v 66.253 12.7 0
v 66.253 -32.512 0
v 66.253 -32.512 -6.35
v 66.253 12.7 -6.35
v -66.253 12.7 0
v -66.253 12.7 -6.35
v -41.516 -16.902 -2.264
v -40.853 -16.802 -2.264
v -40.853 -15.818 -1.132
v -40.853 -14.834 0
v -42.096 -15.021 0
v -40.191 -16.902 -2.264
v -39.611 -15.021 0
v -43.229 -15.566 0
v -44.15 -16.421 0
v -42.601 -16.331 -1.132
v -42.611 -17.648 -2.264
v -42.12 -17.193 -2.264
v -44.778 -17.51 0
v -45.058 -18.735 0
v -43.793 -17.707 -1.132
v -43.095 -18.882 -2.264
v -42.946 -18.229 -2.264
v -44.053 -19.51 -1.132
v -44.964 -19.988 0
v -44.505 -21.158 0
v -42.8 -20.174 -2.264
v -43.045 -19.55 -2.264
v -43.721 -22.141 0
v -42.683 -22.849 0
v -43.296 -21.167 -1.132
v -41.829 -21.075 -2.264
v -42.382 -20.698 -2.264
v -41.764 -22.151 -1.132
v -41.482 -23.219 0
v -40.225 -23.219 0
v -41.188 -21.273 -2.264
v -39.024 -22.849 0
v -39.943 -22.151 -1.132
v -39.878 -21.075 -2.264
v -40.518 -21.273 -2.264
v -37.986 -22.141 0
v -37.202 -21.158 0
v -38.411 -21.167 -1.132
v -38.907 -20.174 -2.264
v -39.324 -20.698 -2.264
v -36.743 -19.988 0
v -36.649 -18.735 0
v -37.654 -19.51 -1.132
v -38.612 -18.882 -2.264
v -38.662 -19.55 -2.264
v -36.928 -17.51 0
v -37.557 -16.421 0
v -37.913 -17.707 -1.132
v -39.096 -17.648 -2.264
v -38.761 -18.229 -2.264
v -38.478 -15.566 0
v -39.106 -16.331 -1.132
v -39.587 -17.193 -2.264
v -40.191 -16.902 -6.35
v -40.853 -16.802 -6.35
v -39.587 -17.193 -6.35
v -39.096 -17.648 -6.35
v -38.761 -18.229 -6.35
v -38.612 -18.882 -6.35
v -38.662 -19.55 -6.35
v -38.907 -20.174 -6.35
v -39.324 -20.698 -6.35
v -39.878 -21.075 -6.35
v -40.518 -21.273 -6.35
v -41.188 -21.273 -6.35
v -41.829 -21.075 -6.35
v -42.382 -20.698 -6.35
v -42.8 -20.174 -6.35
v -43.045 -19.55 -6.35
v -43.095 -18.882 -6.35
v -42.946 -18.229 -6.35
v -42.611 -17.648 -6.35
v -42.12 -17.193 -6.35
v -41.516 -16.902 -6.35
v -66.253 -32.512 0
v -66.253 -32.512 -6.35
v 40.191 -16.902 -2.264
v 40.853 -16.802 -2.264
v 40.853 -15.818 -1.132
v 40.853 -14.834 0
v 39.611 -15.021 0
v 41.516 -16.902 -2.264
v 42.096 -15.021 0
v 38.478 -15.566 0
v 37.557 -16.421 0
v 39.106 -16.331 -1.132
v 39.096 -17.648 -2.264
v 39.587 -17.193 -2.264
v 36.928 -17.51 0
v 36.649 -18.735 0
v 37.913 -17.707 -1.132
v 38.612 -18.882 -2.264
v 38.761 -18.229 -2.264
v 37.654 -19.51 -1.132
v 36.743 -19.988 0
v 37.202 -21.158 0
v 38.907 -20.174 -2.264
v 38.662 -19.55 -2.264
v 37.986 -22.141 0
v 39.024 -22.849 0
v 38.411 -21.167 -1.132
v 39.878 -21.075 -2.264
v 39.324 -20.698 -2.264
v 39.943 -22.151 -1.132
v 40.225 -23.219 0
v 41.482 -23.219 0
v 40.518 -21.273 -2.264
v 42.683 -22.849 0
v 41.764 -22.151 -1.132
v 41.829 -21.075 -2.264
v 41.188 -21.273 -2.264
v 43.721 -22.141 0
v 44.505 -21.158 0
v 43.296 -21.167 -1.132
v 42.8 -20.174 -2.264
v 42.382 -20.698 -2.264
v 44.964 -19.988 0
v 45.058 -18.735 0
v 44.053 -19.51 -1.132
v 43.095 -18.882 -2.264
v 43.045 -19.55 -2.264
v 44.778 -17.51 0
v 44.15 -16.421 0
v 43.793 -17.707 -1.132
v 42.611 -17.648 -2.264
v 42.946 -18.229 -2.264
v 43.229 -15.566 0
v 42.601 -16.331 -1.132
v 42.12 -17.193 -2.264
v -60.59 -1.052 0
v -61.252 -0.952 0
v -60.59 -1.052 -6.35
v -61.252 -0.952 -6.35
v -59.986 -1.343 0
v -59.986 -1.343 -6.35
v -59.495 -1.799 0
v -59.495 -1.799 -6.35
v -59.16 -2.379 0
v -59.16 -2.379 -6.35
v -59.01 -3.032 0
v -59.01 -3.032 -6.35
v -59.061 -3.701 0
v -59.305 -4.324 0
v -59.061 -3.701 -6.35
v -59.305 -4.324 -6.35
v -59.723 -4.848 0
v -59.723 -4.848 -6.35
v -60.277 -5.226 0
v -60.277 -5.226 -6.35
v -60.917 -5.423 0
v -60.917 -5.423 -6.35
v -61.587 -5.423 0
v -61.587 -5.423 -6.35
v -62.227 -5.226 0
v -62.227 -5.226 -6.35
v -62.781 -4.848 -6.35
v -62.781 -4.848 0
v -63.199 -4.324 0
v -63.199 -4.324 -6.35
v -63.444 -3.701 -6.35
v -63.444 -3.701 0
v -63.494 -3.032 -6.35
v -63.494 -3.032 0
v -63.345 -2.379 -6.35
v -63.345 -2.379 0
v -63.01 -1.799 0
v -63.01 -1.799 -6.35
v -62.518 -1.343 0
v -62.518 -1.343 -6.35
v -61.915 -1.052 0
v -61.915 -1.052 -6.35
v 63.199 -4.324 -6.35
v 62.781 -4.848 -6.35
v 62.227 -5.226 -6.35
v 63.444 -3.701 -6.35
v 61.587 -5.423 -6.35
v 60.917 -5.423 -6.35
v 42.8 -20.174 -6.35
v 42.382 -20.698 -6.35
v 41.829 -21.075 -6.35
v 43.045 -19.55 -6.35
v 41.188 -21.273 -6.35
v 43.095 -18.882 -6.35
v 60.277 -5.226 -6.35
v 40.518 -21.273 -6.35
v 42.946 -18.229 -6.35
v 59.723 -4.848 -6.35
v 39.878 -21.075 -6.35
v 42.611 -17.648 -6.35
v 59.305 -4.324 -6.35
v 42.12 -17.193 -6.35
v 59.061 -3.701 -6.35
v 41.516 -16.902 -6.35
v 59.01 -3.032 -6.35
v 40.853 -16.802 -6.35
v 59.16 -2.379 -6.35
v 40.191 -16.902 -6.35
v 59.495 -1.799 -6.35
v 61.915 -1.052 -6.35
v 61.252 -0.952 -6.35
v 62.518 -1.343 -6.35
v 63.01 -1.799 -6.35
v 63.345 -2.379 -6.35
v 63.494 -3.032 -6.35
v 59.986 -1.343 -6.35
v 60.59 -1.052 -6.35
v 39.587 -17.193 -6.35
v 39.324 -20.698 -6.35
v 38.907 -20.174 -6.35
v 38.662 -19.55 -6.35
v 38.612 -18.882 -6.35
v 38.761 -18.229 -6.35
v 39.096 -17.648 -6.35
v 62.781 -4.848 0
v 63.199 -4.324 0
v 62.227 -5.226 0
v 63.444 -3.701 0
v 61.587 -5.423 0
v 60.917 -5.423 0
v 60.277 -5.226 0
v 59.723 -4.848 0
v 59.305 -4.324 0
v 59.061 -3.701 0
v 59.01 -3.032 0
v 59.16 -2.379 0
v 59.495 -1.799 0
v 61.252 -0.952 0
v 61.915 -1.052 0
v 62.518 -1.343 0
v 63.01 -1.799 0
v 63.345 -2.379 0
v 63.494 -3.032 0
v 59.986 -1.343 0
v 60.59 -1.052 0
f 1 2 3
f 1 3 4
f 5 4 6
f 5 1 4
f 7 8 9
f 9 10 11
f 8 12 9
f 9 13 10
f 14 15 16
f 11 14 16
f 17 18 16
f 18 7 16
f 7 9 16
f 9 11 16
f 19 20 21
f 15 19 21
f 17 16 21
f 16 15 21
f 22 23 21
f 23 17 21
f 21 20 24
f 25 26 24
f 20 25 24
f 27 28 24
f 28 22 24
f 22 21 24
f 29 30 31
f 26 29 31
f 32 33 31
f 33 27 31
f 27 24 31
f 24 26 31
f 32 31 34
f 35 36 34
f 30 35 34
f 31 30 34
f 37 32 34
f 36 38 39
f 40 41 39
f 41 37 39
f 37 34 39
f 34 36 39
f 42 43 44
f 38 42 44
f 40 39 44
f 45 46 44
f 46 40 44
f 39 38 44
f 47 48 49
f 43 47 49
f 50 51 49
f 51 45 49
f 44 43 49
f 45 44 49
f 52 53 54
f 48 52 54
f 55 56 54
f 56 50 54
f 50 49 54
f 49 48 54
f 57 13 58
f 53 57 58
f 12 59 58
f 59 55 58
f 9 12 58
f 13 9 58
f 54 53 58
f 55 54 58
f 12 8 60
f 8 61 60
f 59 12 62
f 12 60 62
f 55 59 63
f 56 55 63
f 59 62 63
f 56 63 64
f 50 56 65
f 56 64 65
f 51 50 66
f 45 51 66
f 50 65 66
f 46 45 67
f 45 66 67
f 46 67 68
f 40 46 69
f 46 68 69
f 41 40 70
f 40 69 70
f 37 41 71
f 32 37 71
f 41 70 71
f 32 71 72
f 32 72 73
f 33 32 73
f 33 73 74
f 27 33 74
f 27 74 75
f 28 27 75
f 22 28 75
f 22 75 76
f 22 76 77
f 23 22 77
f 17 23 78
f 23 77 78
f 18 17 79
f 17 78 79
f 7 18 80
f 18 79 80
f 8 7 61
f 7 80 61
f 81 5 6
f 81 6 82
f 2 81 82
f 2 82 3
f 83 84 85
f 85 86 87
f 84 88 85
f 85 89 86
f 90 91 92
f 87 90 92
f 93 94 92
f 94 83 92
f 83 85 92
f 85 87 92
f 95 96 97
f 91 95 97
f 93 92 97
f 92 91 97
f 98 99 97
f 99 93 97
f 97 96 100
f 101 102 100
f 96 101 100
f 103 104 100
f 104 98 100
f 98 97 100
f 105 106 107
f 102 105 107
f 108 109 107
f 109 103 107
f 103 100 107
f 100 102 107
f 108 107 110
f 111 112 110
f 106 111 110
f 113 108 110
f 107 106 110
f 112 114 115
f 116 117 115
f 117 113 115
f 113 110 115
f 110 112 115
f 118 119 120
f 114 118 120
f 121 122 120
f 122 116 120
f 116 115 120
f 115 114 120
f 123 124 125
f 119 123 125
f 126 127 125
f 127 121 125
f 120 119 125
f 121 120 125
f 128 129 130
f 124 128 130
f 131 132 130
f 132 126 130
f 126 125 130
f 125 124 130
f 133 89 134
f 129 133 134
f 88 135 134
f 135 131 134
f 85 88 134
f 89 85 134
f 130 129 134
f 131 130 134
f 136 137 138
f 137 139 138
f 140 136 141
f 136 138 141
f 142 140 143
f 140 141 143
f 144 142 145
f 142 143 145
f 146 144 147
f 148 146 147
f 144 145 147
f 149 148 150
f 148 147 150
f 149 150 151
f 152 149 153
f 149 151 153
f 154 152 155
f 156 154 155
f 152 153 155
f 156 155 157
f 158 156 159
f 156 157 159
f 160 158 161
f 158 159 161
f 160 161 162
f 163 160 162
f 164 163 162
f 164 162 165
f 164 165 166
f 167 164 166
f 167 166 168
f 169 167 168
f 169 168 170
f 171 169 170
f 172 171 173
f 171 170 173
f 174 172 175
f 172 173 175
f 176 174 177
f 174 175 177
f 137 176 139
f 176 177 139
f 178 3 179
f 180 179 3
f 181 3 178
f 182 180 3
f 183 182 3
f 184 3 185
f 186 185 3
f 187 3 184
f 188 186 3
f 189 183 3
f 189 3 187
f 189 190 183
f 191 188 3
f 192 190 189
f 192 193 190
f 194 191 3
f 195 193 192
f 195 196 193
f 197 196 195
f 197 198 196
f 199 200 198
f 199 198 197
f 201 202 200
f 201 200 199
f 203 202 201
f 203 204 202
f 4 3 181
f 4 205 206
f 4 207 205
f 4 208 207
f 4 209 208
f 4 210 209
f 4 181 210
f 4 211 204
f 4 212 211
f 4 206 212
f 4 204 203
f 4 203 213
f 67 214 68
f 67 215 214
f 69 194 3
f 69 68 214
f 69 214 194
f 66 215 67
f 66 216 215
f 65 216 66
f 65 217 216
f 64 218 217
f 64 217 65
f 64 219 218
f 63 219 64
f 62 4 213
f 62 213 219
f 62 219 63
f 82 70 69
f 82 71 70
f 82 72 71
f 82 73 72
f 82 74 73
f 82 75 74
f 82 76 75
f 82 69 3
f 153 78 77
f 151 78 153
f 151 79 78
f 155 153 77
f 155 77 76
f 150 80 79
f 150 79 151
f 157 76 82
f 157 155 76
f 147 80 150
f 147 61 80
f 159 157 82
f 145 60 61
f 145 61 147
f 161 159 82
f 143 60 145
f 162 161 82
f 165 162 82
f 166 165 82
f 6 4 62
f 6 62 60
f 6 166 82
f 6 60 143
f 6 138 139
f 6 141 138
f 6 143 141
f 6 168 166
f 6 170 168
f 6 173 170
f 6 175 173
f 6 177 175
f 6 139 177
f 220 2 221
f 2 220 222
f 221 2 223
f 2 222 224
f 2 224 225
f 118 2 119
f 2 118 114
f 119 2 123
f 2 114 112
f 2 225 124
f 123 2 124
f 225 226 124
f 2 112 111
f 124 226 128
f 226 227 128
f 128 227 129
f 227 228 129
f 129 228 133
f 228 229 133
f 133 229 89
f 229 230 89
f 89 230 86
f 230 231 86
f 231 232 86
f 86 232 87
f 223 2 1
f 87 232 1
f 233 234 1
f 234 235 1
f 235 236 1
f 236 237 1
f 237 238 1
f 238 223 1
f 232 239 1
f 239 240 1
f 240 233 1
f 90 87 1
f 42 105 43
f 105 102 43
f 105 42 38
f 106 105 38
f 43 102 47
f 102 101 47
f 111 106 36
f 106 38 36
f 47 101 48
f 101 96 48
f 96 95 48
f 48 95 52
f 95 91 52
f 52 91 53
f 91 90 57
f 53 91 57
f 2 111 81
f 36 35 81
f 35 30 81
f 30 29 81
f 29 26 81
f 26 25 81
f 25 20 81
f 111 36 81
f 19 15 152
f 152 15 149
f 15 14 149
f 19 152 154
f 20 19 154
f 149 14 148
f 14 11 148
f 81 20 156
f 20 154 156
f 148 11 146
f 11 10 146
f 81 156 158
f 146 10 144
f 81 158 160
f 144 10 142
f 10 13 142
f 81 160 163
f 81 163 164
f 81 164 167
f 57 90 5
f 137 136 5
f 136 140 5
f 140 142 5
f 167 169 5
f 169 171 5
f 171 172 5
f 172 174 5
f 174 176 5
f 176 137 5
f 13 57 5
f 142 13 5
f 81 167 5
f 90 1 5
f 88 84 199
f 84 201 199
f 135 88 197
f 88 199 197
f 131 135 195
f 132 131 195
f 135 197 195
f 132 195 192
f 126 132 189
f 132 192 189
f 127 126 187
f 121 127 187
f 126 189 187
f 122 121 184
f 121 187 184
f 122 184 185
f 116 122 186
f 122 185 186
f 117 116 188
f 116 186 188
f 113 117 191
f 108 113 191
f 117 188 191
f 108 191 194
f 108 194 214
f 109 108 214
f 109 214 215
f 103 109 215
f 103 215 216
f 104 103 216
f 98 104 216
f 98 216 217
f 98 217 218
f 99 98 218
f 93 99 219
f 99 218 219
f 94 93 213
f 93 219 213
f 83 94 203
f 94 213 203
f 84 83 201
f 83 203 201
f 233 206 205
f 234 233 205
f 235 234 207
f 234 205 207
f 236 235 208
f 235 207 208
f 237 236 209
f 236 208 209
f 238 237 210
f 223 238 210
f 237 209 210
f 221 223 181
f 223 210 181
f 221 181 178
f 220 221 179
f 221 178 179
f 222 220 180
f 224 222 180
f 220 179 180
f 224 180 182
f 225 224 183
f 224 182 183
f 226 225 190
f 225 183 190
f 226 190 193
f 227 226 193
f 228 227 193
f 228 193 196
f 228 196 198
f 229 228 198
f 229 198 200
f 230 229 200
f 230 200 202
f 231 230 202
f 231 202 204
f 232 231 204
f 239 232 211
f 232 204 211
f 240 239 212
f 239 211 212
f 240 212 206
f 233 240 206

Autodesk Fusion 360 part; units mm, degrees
sketch "Sketch2" plane through (0, 0, 0) normal (0, 0, 1) x (1, 0, 0)
  line L0 (-66.2534, 12.7) -> (66.2534, 12.7)
  line L1 (66.2534, 12.7) -> (66.2534, -12.7)
  line L2 (66.2534, -12.7) -> (-66.2534, -12.7)
  line L3 (-66.2534, -12.7) -> (-66.2534, 12.7)
  line L4 (-66.2534, 0) -> (66.2534, 0) construction
  line L5 (0, 12.7) -> (0, -12.7) construction
  line L6 (-66.2534, -12.7) -> (66.2534, -12.7)
  line L7 (66.2534, -12.7) -> (66.2534, -32.512)
  line L8 (66.2534, -32.512) -> (-66.2534, -32.512)
  line L9 (-66.2534, -32.512) -> (-66.2534, -12.7)
  point P0 (-61.2521, 0)
  point P1 (61.2521, 0)
  point P2 (-40.8534, -19.05)
  point P3 (-61.2521, -3.2004)
  point P4 (61.2521, -3.2004)
  point P5 (40.8534, -19.05)
  dimension "d2" = 25.4
  dimension "d3" = 122.5042
  dimension "d4" = 132.5067
  dimension "d18" = 3.2004
  dimension "d19" = 25.4
  dimension "d22" = 19.05
  dimension "d23" = 19.812
extrude "Extrude1" add sketch "Sketch2" along normal blind 6.35
hole "Hole1" at (-61.2521, -3.2004, 0) at (61.2521, -3.2004, 0) direction (0, 0, 1) diameter 4.4958 end through all
hole "Hole2" at (-40.8534, -19.05, 0) at (40.8534, -19.05, 0) direction (0, 0, 1) diameter 4.4958 depth 7.62 tip angle 118 countersink diameter 8.4328 countersink angle 82
move_body "Move1" bodies 1 to x (-1, 0, 0) y (0, 1, 0) z (0, 0, -1) at (0, 0, 0)
equation "d3 = tiptop_spacing"
equation "d4 = 5.125 in + ( ( 0.0459 * 2 ) * 1 in )"
equation "synthrotek_spacing = 4.741 in"
equation "tiptop_spacing = 4.823 in"
